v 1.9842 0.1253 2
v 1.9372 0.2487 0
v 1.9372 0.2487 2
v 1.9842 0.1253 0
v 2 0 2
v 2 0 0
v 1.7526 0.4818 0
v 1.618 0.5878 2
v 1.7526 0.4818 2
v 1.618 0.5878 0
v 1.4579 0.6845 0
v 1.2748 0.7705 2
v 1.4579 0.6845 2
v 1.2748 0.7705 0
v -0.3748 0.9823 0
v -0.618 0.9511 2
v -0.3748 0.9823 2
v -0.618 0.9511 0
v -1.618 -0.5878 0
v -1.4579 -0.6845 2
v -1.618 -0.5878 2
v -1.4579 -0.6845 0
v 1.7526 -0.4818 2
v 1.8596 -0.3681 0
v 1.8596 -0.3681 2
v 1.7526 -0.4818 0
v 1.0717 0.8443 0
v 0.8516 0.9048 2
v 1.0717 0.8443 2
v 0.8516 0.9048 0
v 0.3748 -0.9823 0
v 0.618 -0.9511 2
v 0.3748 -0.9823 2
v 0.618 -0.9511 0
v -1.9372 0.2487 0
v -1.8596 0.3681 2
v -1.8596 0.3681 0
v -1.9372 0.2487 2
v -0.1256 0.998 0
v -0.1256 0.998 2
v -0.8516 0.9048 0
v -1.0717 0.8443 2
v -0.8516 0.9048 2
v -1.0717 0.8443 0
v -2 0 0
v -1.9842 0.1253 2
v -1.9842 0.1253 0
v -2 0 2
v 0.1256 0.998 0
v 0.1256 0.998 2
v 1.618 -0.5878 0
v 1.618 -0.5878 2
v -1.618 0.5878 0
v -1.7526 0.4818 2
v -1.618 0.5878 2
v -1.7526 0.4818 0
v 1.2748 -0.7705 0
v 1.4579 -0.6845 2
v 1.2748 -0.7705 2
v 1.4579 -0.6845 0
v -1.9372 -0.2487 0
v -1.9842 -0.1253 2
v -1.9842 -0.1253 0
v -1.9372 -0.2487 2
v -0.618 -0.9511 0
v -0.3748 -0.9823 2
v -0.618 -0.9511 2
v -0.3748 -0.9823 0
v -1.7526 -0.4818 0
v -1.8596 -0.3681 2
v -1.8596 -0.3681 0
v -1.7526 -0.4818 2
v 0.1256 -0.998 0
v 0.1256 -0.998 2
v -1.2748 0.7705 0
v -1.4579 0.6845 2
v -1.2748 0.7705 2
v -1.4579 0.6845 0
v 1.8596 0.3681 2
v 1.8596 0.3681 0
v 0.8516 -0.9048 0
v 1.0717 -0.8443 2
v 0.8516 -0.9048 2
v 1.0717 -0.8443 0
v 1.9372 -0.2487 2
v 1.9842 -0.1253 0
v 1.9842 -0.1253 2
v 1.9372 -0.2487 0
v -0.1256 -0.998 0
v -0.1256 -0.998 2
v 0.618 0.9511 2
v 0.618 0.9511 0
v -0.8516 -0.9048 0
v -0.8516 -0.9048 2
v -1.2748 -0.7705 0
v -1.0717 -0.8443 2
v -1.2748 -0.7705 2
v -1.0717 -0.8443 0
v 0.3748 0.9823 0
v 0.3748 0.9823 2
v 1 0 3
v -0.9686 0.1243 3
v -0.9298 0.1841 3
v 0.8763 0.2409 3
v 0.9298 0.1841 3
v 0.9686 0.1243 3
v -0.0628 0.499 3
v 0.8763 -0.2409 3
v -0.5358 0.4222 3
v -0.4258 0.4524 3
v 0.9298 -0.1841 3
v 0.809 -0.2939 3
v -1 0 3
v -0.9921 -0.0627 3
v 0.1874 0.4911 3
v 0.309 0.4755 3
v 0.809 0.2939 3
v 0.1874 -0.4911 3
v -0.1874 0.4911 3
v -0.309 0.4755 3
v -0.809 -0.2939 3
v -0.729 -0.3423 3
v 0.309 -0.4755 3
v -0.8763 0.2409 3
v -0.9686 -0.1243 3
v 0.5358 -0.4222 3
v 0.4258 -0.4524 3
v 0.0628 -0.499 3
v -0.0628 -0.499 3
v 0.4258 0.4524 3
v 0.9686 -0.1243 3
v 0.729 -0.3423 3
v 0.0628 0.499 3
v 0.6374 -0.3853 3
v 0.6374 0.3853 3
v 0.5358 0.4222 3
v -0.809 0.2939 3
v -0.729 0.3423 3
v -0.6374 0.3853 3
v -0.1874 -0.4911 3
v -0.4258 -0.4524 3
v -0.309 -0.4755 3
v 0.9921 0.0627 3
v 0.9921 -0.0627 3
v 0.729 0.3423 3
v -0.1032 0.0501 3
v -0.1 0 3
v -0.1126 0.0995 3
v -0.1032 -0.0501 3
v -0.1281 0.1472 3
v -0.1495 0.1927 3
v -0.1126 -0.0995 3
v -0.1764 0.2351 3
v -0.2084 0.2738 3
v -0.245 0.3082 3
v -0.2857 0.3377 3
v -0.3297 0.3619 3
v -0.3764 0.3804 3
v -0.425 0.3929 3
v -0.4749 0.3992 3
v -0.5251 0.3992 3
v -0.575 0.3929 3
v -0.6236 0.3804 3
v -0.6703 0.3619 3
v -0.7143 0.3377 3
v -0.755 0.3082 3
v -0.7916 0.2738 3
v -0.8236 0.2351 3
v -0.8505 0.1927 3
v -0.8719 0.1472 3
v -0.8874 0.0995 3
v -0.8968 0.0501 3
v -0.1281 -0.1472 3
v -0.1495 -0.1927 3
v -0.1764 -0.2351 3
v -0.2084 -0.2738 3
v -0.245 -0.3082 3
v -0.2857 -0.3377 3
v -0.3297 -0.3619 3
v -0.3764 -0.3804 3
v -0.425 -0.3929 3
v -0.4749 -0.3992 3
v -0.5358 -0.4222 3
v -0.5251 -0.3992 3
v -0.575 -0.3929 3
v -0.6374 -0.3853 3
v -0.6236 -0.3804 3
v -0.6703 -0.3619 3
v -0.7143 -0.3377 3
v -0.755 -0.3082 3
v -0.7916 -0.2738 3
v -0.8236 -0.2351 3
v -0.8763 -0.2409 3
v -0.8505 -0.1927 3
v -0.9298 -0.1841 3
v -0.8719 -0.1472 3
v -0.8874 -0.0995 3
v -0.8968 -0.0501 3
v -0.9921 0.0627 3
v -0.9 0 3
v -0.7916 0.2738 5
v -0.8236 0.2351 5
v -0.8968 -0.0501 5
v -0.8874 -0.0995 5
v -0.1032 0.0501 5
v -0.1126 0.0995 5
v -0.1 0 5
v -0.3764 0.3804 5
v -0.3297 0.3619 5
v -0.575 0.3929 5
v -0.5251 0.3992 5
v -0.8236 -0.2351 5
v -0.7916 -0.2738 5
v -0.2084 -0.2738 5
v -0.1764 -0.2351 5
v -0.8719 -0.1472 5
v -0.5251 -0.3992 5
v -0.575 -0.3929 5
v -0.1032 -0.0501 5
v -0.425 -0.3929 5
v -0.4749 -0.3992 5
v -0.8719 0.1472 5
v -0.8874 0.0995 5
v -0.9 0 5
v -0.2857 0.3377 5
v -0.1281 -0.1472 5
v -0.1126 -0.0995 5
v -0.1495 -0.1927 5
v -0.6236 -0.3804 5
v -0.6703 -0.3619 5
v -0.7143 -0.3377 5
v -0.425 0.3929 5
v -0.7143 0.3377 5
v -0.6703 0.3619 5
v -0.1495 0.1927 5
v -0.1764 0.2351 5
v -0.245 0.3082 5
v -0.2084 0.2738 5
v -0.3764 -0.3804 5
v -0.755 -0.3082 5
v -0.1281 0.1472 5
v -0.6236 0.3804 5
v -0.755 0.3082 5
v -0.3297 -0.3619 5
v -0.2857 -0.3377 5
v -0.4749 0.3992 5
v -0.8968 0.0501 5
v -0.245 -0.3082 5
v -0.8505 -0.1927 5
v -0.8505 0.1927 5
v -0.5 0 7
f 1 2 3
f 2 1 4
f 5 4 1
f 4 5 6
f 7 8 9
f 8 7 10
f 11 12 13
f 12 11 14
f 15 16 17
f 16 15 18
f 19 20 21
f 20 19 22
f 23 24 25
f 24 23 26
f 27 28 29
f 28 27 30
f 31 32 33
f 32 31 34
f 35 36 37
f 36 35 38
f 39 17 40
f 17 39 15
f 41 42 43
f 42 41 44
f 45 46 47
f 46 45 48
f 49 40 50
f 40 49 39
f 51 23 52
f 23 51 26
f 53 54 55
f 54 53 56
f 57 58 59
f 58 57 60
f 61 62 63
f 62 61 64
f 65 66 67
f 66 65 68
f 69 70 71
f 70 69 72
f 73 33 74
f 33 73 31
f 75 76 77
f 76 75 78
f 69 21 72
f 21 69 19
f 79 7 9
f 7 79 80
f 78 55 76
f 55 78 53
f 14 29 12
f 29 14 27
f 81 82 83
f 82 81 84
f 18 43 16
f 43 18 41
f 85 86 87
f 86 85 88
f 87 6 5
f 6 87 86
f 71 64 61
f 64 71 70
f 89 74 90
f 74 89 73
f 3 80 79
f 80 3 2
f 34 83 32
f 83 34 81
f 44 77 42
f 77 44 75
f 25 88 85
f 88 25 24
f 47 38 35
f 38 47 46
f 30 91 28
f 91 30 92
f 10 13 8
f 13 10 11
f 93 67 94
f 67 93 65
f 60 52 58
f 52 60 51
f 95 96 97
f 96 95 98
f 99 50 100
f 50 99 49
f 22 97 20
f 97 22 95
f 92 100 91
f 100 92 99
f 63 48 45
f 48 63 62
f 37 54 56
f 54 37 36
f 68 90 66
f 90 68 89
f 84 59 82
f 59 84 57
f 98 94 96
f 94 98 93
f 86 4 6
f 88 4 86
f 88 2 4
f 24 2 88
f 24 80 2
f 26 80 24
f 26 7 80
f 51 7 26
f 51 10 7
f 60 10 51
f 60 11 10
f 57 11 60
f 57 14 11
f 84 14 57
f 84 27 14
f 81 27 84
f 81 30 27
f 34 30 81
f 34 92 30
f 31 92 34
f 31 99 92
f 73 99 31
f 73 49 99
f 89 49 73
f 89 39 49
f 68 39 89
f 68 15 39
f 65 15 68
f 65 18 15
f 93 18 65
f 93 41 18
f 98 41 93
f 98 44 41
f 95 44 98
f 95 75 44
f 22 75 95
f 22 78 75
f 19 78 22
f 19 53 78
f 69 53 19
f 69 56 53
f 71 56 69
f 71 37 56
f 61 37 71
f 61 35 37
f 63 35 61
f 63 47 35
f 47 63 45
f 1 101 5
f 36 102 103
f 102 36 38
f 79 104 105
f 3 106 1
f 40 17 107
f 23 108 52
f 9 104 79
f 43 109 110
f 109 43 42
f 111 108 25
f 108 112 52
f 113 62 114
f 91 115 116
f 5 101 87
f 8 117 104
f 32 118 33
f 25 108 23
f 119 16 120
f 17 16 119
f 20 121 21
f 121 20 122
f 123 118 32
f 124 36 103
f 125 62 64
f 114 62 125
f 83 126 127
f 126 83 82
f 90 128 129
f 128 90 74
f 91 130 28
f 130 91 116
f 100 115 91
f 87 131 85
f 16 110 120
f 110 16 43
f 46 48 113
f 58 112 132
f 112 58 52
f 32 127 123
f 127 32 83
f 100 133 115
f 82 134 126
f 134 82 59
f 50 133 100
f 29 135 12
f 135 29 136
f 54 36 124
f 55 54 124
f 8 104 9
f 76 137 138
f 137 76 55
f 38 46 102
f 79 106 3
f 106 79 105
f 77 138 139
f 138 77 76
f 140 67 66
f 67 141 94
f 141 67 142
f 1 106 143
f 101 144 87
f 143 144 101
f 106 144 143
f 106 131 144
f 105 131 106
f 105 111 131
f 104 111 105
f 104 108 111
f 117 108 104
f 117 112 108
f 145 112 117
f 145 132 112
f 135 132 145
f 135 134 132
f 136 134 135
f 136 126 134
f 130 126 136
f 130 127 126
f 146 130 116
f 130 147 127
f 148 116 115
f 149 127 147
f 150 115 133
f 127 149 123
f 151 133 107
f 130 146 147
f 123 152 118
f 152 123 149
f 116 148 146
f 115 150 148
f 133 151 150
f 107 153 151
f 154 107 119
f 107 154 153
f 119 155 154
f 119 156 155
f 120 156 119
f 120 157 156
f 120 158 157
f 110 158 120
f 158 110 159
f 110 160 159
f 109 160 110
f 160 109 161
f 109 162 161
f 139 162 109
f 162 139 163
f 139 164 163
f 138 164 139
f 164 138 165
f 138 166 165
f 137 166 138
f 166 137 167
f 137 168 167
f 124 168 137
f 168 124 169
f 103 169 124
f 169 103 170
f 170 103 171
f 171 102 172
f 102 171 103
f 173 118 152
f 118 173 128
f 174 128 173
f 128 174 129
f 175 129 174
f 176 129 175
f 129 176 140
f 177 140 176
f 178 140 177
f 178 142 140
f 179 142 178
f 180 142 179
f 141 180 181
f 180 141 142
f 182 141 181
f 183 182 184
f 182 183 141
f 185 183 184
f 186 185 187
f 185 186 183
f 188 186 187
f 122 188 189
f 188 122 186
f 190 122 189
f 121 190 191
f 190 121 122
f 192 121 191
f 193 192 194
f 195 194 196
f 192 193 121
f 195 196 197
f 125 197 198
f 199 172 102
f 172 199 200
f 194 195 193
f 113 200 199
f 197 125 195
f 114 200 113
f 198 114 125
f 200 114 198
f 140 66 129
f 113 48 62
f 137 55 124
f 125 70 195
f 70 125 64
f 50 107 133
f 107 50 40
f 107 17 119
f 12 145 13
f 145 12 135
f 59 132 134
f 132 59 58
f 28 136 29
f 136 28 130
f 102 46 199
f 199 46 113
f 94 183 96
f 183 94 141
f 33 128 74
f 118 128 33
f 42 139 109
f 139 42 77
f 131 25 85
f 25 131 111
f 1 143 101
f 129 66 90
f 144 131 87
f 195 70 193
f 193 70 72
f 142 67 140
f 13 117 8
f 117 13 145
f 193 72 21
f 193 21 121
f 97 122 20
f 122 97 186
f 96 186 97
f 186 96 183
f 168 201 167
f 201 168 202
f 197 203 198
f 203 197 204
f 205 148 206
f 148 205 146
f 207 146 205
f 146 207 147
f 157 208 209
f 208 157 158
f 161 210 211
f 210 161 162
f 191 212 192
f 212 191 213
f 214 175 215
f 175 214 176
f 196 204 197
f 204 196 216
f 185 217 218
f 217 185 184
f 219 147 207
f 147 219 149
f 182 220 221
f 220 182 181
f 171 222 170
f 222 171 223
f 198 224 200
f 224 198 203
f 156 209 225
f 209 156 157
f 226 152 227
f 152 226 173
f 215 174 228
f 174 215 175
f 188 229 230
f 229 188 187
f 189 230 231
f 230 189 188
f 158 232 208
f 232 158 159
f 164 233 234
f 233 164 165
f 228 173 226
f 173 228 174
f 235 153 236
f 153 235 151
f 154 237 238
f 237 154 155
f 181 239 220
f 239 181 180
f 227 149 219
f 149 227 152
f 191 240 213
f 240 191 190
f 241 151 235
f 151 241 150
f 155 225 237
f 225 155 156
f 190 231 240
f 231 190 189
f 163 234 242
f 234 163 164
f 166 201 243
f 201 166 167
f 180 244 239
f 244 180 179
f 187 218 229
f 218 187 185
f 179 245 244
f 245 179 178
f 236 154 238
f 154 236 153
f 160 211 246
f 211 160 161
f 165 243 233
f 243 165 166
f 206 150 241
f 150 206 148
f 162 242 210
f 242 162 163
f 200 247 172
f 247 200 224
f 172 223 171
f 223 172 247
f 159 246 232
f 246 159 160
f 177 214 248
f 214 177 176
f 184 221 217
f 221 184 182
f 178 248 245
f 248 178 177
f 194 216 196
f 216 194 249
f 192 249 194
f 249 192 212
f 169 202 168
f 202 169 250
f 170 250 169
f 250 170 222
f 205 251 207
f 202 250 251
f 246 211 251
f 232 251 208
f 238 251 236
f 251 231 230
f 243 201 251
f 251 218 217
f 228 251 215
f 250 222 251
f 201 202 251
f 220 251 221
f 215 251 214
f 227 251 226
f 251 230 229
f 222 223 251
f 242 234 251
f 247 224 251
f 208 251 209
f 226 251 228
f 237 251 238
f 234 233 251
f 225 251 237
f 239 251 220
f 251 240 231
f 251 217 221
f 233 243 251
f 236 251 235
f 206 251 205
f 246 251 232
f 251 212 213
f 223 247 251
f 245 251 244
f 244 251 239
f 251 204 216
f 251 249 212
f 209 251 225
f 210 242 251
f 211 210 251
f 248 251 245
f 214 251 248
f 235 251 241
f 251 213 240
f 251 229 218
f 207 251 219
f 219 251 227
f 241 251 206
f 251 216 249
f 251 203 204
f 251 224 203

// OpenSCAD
$fn=50;

scale([2, 1, 1]) {
  cylinder(2,1,1);
  translate([0, 0, 2])
    cylinder(1, 1, 0.5);


};

translate([-0.5, 0, 3]) {
  cylinder(2, 0.4, 0.4);
  translate([0, 0, 2]) {
    cylinder(2, 0.4, 0);
  }
}
